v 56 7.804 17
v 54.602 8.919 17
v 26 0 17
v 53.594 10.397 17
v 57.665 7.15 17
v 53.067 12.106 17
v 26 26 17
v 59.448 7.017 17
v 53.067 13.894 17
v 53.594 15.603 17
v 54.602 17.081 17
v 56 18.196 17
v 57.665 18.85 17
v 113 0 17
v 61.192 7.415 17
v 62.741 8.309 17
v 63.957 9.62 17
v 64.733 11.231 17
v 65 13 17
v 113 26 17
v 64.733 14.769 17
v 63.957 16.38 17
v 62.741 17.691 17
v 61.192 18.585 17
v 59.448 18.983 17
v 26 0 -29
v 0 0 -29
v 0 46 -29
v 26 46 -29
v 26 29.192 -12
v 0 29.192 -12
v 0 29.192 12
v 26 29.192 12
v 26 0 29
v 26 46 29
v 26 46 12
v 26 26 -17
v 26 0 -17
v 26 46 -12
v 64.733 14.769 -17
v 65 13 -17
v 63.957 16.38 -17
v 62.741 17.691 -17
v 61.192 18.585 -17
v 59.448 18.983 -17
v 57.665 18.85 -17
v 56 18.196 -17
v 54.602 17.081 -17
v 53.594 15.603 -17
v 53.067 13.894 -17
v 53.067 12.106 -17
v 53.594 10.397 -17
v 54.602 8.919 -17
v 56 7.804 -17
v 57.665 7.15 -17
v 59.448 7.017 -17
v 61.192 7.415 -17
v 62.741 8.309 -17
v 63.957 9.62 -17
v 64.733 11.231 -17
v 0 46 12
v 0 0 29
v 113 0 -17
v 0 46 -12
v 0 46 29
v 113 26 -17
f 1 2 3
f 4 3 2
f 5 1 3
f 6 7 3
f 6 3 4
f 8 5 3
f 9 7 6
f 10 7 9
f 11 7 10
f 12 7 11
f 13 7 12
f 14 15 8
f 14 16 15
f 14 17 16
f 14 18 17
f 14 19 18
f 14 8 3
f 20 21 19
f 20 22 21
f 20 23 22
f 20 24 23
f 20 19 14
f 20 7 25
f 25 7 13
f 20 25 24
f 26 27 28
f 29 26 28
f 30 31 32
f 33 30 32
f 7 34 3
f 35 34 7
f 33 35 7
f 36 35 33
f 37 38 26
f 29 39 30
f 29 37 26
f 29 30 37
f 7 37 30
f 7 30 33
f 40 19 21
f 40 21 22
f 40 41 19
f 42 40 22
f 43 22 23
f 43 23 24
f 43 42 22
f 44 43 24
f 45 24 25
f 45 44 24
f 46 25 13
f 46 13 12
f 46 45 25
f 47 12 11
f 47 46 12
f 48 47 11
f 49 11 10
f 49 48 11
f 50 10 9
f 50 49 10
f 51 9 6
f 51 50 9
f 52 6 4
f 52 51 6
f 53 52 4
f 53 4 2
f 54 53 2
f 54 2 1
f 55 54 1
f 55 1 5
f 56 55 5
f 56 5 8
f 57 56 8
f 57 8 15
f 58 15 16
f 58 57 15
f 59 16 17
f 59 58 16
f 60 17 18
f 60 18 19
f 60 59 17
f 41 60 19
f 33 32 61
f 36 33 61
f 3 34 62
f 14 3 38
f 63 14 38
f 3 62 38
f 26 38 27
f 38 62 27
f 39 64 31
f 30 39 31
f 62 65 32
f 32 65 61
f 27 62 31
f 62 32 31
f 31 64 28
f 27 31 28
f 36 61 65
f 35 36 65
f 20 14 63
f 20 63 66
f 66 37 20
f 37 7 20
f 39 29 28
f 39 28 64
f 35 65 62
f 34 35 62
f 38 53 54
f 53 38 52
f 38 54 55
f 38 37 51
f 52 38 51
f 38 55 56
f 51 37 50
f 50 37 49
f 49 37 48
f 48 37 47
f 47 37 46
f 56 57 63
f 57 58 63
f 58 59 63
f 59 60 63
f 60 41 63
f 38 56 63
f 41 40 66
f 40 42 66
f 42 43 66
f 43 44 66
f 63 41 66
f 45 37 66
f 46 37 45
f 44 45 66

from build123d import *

# Parameters (mm, degrees)
EXTRUDE_1_DEPTH = 26
SKETCH_2_W      = 87
SKETCH_2_H      = 26
SKETCH_2_R      = 6
EXTRUDE_2_DEPTH = 17


with BuildPart() as part:
    # 스케치1 → 보스-돌출1 (new body)
    with BuildSketch(Plane(origin=(0, 0, 0), x_dir=(0, 0, -1), z_dir=(1, 0, 0))):
        Polygon((-29, 0), (29, 0), (29, 46), (12, 46), (12, 29.19214502), (-12, 29.19214502), (-12, 46), (-29, 46), align=None)
    extrude(amount=EXTRUDE_1_DEPTH)

    # 스케치2 → 보스-돌출2 (add, symmetric)
    with BuildSketch(Plane.XY):
        with Locations((69.5, 13)):
            Rectangle(SKETCH_2_W, SKETCH_2_H)
        with Locations((59, 13)):
            Circle(SKETCH_2_R, mode=Mode.SUBTRACT)
    extrude(amount=EXTRUDE_2_DEPTH, both=True)


solid = part.part
